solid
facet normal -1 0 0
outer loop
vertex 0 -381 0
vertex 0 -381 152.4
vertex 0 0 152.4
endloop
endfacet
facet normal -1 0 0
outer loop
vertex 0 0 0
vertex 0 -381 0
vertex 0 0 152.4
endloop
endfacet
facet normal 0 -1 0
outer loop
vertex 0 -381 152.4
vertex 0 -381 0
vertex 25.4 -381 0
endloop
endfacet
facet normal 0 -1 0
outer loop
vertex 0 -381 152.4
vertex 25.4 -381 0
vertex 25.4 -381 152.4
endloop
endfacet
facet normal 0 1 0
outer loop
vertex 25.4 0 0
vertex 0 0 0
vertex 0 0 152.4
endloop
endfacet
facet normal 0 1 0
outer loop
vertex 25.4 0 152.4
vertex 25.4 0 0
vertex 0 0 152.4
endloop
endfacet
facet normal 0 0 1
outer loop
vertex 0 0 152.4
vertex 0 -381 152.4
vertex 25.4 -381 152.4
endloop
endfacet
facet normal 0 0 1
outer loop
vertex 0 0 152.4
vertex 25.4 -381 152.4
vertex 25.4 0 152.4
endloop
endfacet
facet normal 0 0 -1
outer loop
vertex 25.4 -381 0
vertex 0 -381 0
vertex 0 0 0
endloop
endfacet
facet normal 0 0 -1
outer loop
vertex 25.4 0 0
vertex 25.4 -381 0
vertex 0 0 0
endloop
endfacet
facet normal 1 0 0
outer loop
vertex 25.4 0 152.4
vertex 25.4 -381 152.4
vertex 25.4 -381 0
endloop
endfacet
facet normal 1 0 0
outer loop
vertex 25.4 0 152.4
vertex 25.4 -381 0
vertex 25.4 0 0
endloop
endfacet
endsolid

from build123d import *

# Parameters (mm, degrees)
F0_W     = 381
F0_H     = 152.4
F1_DEPTH = 25.4
F3_W     = 381
F3_H     = 152.4
F4_DEPTH = 25.4


with BuildPart() as f1:
    # F0 (on Front) → F1 (new body)
    with BuildSketch(Plane.XZ):
        with Locations((-82.7160514891, -6.6580822694)):
            Rectangle(F0_W, F0_H)
    extrude(amount=F1_DEPTH)


with BuildPart() as f4:
    # F3 (on Right) → F4 (new body)
    with BuildSketch(Plane.YZ):
        with Locations((-190.5, 76.2)):
            Rectangle(F3_W, F3_H)
    extrude(amount=F4_DEPTH)


solid = f4.part
